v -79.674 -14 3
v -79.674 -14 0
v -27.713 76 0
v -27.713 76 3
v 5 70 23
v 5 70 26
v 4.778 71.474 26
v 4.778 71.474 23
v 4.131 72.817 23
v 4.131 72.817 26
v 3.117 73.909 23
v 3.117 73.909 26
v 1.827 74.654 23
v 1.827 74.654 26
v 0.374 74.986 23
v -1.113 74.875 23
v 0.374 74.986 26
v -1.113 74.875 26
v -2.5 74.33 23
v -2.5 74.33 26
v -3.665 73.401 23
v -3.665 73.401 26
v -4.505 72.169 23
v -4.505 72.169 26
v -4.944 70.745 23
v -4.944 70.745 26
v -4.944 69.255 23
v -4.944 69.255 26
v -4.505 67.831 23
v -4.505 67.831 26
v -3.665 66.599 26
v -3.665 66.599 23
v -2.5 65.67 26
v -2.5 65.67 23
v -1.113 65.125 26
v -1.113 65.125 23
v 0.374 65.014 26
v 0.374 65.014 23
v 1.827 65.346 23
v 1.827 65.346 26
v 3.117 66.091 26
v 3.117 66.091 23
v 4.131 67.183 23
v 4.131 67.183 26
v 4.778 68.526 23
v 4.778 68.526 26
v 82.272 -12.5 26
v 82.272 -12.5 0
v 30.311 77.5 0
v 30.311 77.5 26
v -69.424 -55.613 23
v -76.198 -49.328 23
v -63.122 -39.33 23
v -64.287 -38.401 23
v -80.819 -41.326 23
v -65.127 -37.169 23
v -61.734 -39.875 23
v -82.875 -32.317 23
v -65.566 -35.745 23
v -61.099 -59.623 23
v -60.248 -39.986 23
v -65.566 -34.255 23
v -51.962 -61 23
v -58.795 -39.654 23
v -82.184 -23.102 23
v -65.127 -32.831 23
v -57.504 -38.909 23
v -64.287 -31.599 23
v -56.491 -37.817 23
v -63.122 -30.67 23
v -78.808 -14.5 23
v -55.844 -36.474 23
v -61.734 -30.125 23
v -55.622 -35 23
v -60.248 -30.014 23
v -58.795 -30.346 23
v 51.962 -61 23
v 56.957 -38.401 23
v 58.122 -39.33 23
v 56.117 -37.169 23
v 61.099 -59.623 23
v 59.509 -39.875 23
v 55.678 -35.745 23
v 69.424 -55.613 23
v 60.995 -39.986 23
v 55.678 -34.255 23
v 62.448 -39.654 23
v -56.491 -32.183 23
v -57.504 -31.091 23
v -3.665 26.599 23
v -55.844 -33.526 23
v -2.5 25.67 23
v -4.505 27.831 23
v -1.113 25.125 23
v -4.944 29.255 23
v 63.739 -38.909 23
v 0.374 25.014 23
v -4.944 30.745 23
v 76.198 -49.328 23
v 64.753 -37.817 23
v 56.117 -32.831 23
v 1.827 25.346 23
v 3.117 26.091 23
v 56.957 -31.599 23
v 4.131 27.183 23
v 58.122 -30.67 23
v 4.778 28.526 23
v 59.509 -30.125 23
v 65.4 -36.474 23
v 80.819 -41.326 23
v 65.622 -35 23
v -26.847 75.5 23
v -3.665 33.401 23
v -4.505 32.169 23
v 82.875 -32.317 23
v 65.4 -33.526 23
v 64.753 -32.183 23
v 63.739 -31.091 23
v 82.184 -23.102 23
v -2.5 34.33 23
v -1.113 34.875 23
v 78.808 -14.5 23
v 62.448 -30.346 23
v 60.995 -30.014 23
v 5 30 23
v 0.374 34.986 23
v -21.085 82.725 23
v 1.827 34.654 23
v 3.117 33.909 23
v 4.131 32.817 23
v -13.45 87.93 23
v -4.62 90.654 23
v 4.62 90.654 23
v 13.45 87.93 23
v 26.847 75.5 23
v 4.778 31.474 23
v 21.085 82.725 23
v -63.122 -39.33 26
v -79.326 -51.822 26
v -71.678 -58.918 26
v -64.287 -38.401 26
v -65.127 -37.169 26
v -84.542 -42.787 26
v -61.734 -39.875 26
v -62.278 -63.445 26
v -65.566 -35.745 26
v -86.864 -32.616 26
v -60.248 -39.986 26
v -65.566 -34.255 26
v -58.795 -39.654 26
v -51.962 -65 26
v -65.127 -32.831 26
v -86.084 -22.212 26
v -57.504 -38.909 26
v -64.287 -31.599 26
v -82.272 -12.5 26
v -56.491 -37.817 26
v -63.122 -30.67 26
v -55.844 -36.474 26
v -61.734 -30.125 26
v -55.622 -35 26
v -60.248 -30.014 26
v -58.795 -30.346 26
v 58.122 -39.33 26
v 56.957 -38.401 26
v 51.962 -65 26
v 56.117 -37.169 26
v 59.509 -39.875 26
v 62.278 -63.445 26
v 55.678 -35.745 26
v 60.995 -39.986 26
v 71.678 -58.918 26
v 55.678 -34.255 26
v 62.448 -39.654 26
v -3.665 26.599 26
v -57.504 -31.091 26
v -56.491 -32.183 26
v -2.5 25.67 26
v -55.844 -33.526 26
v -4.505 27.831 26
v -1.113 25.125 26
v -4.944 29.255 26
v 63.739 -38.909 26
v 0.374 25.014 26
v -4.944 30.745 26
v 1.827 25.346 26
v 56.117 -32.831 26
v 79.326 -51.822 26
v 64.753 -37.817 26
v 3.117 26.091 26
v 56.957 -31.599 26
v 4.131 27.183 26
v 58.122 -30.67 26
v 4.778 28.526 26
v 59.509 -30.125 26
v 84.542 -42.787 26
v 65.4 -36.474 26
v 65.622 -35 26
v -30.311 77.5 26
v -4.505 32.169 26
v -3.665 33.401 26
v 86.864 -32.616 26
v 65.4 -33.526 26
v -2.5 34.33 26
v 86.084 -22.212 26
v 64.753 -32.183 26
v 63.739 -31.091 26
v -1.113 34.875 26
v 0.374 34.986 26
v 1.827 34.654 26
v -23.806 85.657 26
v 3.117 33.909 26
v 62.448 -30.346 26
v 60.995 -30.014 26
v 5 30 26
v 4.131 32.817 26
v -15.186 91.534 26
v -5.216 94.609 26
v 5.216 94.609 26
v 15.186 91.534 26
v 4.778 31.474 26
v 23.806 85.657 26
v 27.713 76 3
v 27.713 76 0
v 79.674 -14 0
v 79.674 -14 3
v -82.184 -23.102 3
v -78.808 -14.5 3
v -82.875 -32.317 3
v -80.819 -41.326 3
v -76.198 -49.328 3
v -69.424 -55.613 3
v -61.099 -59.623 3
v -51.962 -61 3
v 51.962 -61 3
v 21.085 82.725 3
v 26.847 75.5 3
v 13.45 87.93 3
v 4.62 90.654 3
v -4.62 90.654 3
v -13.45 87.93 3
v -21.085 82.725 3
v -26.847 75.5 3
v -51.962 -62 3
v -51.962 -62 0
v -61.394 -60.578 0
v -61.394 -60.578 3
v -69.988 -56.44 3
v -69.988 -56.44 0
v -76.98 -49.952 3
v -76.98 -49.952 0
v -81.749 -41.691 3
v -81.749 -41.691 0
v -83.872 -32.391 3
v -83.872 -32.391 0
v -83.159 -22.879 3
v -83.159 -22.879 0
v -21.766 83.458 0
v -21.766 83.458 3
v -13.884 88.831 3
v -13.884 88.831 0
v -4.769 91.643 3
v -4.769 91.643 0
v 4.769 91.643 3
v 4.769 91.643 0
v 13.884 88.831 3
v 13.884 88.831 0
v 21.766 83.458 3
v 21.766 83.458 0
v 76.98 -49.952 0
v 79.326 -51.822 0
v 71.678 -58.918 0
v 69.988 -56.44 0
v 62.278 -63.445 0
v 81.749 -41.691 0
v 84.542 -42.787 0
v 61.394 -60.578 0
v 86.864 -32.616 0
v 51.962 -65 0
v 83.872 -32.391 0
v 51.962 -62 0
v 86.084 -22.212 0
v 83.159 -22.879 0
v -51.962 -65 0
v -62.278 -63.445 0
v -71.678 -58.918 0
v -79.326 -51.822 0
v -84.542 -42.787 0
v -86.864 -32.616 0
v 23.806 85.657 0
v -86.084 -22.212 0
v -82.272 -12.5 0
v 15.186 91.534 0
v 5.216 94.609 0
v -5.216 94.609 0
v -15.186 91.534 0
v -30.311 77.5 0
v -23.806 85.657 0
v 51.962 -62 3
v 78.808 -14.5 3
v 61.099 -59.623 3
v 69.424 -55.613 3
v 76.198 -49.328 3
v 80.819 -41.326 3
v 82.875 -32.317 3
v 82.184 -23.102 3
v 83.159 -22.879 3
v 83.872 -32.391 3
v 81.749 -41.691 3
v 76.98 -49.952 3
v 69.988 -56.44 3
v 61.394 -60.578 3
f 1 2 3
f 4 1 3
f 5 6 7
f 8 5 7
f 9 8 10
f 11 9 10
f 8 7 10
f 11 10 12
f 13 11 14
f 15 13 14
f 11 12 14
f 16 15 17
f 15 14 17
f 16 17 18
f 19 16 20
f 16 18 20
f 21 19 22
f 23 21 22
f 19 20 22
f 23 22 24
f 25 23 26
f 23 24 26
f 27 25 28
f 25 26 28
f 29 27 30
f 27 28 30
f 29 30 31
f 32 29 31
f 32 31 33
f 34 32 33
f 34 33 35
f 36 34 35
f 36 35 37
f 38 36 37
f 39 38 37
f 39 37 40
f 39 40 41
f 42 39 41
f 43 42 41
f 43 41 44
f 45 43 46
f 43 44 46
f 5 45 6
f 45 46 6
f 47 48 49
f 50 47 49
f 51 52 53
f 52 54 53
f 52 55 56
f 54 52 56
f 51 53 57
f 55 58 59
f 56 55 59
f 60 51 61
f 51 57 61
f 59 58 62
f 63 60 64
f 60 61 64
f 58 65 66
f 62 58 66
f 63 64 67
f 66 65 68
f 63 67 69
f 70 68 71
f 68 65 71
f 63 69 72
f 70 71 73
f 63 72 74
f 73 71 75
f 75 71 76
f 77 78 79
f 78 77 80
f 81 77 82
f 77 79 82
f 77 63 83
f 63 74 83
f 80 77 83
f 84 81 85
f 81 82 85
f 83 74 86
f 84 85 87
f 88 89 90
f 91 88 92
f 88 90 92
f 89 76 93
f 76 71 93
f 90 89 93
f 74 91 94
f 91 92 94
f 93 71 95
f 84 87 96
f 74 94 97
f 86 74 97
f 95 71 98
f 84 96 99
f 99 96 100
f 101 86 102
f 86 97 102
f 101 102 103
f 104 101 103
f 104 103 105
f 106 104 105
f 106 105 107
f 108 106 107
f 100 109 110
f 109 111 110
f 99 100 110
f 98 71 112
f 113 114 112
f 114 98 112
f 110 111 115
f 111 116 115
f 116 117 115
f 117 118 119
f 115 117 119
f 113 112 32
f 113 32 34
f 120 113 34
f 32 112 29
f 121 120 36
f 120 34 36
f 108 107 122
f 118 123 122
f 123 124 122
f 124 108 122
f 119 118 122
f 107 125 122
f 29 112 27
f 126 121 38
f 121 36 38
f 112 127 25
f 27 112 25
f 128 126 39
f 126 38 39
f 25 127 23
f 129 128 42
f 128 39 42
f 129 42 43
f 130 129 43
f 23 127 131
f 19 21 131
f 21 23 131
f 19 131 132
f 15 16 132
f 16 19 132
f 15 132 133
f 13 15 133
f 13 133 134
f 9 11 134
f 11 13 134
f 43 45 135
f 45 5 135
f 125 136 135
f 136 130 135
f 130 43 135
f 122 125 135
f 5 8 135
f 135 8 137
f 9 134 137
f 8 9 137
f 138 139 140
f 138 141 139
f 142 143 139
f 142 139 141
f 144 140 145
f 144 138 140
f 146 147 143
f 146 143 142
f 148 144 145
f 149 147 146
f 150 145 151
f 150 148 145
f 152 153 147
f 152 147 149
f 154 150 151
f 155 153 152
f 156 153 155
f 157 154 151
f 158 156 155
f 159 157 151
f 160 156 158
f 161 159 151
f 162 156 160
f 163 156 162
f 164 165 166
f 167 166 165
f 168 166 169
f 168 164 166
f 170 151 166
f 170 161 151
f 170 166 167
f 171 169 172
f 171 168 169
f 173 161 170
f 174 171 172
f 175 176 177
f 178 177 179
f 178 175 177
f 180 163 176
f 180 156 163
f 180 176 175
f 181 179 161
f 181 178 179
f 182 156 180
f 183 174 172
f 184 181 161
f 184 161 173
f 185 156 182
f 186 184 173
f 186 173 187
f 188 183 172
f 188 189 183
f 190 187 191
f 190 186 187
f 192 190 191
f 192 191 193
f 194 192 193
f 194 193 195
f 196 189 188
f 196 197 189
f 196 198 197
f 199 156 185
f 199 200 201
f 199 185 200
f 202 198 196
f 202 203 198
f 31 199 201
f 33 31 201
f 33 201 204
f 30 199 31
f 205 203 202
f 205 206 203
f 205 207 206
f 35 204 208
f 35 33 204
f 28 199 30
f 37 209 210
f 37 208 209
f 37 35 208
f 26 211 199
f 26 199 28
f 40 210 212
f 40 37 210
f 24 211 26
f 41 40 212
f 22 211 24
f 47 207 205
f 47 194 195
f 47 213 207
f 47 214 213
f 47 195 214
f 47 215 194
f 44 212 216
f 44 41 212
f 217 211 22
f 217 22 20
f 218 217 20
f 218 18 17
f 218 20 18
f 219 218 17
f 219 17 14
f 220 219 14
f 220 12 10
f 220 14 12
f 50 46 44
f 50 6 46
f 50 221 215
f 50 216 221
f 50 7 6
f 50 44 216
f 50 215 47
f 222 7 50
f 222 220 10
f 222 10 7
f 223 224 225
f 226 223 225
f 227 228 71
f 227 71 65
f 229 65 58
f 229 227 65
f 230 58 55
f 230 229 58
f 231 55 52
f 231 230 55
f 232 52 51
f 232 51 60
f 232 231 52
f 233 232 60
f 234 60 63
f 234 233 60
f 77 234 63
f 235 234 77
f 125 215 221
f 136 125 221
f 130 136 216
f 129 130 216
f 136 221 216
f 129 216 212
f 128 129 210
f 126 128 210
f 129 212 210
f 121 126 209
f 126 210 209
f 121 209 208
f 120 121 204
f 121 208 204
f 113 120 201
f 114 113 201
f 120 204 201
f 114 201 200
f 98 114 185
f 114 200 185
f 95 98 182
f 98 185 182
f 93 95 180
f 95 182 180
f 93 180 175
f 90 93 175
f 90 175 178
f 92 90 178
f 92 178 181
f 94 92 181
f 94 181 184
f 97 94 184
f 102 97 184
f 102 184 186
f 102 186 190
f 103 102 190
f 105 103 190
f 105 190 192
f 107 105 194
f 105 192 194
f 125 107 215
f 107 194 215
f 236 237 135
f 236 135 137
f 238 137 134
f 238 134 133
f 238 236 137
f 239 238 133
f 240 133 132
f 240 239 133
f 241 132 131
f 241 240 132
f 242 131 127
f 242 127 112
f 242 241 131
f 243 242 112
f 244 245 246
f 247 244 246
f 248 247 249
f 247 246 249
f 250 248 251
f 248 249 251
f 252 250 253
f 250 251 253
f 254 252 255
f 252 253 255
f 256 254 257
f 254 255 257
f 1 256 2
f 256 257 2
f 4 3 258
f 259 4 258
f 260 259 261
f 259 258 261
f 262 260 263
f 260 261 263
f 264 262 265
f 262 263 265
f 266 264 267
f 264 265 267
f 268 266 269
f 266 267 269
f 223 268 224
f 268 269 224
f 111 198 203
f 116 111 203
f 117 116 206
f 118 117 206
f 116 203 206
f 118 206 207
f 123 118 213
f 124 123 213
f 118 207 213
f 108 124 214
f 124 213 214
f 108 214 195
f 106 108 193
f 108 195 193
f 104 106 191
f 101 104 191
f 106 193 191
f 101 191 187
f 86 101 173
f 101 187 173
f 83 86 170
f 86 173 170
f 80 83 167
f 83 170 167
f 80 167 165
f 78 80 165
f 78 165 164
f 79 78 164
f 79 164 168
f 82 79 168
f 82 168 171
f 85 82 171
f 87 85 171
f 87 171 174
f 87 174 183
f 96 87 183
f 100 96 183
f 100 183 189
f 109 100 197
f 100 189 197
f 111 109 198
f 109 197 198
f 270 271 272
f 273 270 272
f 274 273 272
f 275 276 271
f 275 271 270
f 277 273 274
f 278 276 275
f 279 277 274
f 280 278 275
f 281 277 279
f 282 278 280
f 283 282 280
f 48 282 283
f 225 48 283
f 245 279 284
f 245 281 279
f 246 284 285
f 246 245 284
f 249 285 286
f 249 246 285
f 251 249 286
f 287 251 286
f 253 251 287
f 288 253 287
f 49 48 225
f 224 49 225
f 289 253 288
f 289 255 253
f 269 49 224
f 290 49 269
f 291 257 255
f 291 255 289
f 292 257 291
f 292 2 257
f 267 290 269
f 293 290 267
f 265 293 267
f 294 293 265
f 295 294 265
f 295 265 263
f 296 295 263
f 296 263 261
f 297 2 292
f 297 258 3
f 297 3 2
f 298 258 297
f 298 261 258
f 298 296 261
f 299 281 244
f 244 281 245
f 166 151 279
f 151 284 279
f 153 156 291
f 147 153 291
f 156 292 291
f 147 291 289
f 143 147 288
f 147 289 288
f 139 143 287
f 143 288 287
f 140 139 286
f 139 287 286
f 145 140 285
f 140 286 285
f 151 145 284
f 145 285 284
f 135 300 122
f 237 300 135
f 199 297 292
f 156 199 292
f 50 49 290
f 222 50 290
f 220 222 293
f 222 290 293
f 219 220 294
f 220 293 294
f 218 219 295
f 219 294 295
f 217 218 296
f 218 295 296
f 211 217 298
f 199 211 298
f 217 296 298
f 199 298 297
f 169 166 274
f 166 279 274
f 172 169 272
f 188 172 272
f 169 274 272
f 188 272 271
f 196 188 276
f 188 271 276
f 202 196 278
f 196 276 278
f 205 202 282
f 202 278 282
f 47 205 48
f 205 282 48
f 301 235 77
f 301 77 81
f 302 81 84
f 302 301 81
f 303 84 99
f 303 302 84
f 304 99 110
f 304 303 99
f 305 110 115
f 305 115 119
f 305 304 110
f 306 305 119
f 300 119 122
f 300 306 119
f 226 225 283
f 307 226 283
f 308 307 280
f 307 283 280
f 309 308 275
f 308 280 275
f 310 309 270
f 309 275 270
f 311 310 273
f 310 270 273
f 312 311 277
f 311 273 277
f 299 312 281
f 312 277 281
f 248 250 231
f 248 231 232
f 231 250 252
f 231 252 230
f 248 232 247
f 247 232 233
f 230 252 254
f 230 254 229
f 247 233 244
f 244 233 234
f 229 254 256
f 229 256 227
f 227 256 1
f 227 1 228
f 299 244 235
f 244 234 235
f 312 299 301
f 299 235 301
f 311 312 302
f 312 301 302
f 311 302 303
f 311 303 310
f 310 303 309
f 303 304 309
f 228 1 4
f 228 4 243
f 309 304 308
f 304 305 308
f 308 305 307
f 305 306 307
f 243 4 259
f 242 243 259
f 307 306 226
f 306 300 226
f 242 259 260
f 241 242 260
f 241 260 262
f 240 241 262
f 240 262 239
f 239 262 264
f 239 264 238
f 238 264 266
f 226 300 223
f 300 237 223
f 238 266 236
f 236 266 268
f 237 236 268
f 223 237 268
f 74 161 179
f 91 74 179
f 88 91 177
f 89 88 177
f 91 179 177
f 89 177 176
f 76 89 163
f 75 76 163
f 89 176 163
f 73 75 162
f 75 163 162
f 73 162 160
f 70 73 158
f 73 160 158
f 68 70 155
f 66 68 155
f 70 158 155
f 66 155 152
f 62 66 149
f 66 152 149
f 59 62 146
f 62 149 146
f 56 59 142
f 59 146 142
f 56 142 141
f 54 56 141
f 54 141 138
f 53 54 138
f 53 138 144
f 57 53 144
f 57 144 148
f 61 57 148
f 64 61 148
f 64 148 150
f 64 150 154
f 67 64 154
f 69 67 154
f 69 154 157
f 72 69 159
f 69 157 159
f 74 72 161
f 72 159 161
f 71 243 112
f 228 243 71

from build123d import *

# Parameters (mm, degrees)
RESSALTO_EXTRUS_O1_DEPTH = 3
RESSALTO_EXTRUS_O2_DEPTH = 20
RESSALTO_EXTRUS_O3_DEPTH = 3
ESBO_O4_R                = 5
CORTE_EXTRUS_O1_DEPTH    = 3


with BuildPart() as part:
    # Esboço1 → Ressalto-extrusão1 (new body)
    with BuildSketch(Plane.XY):
        with BuildLine():
            Line((51.961524227, -65), (-51.961524227, -65))
            ThreePointArc((-51.961524227, -65), (-82.27241336, -47.5), (-82.27241336, -12.5))
            Line((-82.27241336, -12.5), (-30.310889132, 77.5))
            ThreePointArc((-30.310889132, 77.5), (0, 95), (30.310889132, 77.5))
            Line((30.310889132, 77.5), (82.27241336, -12.5))
            ThreePointArc((82.27241336, -12.5), (82.27241336, -47.5), (51.961524227, -65))
        make_face()
        with BuildLine():
            Line((51.961524227, -62), (-51.961524227, -62))
            ThreePointArc((-51.961524227, -62), (-79.674337148, -46), (-79.674337148, -14))
            Line((-79.674337148, -14), (-27.712812921, 76))
            ThreePointArc((-27.712812921, 76), (0, 92), (27.712812921, 76))
            Line((27.712812921, 76), (79.674337148, -14))
            ThreePointArc((79.674337148, -14), (79.674337148, -46), (51.961524227, -62))
        make_face(mode=Mode.SUBTRACT)
    extrude(amount=RESSALTO_EXTRUS_O1_DEPTH)

    # Esboço2 → Ressalto-extrusão2 (add)
    with BuildSketch(Plane.XY.offset(3)):
        with BuildLine():
            Line((-51.961524227, -65), (51.961524227, -65))
            ThreePointArc((51.961524227, -65), (82.27241336, -47.5), (82.27241336, -12.5))
            Line((82.27241336, -12.5), (30.310889132, 77.5))
            ThreePointArc((30.310889132, 77.5), (0, 95), (-30.310889132, 77.5))
            Line((-30.310889132, 77.5), (-82.27241336, -12.5))
            ThreePointArc((-82.27241336, -12.5), (-82.27241336, -47.5), (-51.961524227, -65))
        make_face()
        with BuildLine():
            Line((-51.961524227, -61), (51.961524227, -61))
            ThreePointArc((51.961524227, -61), (78.808311744, -45.5), (78.808311744, -14.5))
            Line((78.808311744, -14.5), (26.846787517, 75.5))
            ThreePointArc((26.846787517, 75.5), (0, 91), (-26.846787517, 75.5))
            Line((-26.846787517, 75.5), (-78.808311744, -14.5))
            ThreePointArc((-78.808311744, -14.5), (-78.808311744, -45.5), (-51.961524227, -61))
        make_face(mode=Mode.SUBTRACT)
    extrude(amount=RESSALTO_EXTRUS_O2_DEPTH)

    # Esboço3 → Ressalto-extrusão3 (add)
    with BuildSketch(Plane.XY.offset(23)):
        with BuildLine():
            Line((-30.310889132, 77.5), (-82.27241336, -12.5))
            ThreePointArc((-82.27241336, -12.5), (-82.27241336, -47.5), (-51.961524227, -65))
            Line((-51.961524227, -65), (51.961524227, -65))
            ThreePointArc((51.961524227, -65), (82.27241336, -47.5), (82.27241336, -12.5))
            Line((82.27241336, -12.5), (30.310889132, 77.5))
            ThreePointArc((30.310889132, 77.5), (0, 95), (-30.310889132, 77.5))
        make_face()
    extrude(amount=RESSALTO_EXTRUS_O3_DEPTH)

    # Esboço4 → Corte-extrusão1 (cut)
    with BuildSketch(Plane.XY.offset(26)):
        with Locations((0, 70)):
            Circle(ESBO_O4_R)
        with Locations((60.621778265, -35)):
            Circle(ESBO_O4_R)
        with Locations((-60.621778265, -35)):
            Circle(ESBO_O4_R)
        with Locations((0, 30)):
            Circle(ESBO_O4_R)
    extrude(amount=-CORTE_EXTRUS_O1_DEPTH, mode=Mode.SUBTRACT)


solid = part.part
